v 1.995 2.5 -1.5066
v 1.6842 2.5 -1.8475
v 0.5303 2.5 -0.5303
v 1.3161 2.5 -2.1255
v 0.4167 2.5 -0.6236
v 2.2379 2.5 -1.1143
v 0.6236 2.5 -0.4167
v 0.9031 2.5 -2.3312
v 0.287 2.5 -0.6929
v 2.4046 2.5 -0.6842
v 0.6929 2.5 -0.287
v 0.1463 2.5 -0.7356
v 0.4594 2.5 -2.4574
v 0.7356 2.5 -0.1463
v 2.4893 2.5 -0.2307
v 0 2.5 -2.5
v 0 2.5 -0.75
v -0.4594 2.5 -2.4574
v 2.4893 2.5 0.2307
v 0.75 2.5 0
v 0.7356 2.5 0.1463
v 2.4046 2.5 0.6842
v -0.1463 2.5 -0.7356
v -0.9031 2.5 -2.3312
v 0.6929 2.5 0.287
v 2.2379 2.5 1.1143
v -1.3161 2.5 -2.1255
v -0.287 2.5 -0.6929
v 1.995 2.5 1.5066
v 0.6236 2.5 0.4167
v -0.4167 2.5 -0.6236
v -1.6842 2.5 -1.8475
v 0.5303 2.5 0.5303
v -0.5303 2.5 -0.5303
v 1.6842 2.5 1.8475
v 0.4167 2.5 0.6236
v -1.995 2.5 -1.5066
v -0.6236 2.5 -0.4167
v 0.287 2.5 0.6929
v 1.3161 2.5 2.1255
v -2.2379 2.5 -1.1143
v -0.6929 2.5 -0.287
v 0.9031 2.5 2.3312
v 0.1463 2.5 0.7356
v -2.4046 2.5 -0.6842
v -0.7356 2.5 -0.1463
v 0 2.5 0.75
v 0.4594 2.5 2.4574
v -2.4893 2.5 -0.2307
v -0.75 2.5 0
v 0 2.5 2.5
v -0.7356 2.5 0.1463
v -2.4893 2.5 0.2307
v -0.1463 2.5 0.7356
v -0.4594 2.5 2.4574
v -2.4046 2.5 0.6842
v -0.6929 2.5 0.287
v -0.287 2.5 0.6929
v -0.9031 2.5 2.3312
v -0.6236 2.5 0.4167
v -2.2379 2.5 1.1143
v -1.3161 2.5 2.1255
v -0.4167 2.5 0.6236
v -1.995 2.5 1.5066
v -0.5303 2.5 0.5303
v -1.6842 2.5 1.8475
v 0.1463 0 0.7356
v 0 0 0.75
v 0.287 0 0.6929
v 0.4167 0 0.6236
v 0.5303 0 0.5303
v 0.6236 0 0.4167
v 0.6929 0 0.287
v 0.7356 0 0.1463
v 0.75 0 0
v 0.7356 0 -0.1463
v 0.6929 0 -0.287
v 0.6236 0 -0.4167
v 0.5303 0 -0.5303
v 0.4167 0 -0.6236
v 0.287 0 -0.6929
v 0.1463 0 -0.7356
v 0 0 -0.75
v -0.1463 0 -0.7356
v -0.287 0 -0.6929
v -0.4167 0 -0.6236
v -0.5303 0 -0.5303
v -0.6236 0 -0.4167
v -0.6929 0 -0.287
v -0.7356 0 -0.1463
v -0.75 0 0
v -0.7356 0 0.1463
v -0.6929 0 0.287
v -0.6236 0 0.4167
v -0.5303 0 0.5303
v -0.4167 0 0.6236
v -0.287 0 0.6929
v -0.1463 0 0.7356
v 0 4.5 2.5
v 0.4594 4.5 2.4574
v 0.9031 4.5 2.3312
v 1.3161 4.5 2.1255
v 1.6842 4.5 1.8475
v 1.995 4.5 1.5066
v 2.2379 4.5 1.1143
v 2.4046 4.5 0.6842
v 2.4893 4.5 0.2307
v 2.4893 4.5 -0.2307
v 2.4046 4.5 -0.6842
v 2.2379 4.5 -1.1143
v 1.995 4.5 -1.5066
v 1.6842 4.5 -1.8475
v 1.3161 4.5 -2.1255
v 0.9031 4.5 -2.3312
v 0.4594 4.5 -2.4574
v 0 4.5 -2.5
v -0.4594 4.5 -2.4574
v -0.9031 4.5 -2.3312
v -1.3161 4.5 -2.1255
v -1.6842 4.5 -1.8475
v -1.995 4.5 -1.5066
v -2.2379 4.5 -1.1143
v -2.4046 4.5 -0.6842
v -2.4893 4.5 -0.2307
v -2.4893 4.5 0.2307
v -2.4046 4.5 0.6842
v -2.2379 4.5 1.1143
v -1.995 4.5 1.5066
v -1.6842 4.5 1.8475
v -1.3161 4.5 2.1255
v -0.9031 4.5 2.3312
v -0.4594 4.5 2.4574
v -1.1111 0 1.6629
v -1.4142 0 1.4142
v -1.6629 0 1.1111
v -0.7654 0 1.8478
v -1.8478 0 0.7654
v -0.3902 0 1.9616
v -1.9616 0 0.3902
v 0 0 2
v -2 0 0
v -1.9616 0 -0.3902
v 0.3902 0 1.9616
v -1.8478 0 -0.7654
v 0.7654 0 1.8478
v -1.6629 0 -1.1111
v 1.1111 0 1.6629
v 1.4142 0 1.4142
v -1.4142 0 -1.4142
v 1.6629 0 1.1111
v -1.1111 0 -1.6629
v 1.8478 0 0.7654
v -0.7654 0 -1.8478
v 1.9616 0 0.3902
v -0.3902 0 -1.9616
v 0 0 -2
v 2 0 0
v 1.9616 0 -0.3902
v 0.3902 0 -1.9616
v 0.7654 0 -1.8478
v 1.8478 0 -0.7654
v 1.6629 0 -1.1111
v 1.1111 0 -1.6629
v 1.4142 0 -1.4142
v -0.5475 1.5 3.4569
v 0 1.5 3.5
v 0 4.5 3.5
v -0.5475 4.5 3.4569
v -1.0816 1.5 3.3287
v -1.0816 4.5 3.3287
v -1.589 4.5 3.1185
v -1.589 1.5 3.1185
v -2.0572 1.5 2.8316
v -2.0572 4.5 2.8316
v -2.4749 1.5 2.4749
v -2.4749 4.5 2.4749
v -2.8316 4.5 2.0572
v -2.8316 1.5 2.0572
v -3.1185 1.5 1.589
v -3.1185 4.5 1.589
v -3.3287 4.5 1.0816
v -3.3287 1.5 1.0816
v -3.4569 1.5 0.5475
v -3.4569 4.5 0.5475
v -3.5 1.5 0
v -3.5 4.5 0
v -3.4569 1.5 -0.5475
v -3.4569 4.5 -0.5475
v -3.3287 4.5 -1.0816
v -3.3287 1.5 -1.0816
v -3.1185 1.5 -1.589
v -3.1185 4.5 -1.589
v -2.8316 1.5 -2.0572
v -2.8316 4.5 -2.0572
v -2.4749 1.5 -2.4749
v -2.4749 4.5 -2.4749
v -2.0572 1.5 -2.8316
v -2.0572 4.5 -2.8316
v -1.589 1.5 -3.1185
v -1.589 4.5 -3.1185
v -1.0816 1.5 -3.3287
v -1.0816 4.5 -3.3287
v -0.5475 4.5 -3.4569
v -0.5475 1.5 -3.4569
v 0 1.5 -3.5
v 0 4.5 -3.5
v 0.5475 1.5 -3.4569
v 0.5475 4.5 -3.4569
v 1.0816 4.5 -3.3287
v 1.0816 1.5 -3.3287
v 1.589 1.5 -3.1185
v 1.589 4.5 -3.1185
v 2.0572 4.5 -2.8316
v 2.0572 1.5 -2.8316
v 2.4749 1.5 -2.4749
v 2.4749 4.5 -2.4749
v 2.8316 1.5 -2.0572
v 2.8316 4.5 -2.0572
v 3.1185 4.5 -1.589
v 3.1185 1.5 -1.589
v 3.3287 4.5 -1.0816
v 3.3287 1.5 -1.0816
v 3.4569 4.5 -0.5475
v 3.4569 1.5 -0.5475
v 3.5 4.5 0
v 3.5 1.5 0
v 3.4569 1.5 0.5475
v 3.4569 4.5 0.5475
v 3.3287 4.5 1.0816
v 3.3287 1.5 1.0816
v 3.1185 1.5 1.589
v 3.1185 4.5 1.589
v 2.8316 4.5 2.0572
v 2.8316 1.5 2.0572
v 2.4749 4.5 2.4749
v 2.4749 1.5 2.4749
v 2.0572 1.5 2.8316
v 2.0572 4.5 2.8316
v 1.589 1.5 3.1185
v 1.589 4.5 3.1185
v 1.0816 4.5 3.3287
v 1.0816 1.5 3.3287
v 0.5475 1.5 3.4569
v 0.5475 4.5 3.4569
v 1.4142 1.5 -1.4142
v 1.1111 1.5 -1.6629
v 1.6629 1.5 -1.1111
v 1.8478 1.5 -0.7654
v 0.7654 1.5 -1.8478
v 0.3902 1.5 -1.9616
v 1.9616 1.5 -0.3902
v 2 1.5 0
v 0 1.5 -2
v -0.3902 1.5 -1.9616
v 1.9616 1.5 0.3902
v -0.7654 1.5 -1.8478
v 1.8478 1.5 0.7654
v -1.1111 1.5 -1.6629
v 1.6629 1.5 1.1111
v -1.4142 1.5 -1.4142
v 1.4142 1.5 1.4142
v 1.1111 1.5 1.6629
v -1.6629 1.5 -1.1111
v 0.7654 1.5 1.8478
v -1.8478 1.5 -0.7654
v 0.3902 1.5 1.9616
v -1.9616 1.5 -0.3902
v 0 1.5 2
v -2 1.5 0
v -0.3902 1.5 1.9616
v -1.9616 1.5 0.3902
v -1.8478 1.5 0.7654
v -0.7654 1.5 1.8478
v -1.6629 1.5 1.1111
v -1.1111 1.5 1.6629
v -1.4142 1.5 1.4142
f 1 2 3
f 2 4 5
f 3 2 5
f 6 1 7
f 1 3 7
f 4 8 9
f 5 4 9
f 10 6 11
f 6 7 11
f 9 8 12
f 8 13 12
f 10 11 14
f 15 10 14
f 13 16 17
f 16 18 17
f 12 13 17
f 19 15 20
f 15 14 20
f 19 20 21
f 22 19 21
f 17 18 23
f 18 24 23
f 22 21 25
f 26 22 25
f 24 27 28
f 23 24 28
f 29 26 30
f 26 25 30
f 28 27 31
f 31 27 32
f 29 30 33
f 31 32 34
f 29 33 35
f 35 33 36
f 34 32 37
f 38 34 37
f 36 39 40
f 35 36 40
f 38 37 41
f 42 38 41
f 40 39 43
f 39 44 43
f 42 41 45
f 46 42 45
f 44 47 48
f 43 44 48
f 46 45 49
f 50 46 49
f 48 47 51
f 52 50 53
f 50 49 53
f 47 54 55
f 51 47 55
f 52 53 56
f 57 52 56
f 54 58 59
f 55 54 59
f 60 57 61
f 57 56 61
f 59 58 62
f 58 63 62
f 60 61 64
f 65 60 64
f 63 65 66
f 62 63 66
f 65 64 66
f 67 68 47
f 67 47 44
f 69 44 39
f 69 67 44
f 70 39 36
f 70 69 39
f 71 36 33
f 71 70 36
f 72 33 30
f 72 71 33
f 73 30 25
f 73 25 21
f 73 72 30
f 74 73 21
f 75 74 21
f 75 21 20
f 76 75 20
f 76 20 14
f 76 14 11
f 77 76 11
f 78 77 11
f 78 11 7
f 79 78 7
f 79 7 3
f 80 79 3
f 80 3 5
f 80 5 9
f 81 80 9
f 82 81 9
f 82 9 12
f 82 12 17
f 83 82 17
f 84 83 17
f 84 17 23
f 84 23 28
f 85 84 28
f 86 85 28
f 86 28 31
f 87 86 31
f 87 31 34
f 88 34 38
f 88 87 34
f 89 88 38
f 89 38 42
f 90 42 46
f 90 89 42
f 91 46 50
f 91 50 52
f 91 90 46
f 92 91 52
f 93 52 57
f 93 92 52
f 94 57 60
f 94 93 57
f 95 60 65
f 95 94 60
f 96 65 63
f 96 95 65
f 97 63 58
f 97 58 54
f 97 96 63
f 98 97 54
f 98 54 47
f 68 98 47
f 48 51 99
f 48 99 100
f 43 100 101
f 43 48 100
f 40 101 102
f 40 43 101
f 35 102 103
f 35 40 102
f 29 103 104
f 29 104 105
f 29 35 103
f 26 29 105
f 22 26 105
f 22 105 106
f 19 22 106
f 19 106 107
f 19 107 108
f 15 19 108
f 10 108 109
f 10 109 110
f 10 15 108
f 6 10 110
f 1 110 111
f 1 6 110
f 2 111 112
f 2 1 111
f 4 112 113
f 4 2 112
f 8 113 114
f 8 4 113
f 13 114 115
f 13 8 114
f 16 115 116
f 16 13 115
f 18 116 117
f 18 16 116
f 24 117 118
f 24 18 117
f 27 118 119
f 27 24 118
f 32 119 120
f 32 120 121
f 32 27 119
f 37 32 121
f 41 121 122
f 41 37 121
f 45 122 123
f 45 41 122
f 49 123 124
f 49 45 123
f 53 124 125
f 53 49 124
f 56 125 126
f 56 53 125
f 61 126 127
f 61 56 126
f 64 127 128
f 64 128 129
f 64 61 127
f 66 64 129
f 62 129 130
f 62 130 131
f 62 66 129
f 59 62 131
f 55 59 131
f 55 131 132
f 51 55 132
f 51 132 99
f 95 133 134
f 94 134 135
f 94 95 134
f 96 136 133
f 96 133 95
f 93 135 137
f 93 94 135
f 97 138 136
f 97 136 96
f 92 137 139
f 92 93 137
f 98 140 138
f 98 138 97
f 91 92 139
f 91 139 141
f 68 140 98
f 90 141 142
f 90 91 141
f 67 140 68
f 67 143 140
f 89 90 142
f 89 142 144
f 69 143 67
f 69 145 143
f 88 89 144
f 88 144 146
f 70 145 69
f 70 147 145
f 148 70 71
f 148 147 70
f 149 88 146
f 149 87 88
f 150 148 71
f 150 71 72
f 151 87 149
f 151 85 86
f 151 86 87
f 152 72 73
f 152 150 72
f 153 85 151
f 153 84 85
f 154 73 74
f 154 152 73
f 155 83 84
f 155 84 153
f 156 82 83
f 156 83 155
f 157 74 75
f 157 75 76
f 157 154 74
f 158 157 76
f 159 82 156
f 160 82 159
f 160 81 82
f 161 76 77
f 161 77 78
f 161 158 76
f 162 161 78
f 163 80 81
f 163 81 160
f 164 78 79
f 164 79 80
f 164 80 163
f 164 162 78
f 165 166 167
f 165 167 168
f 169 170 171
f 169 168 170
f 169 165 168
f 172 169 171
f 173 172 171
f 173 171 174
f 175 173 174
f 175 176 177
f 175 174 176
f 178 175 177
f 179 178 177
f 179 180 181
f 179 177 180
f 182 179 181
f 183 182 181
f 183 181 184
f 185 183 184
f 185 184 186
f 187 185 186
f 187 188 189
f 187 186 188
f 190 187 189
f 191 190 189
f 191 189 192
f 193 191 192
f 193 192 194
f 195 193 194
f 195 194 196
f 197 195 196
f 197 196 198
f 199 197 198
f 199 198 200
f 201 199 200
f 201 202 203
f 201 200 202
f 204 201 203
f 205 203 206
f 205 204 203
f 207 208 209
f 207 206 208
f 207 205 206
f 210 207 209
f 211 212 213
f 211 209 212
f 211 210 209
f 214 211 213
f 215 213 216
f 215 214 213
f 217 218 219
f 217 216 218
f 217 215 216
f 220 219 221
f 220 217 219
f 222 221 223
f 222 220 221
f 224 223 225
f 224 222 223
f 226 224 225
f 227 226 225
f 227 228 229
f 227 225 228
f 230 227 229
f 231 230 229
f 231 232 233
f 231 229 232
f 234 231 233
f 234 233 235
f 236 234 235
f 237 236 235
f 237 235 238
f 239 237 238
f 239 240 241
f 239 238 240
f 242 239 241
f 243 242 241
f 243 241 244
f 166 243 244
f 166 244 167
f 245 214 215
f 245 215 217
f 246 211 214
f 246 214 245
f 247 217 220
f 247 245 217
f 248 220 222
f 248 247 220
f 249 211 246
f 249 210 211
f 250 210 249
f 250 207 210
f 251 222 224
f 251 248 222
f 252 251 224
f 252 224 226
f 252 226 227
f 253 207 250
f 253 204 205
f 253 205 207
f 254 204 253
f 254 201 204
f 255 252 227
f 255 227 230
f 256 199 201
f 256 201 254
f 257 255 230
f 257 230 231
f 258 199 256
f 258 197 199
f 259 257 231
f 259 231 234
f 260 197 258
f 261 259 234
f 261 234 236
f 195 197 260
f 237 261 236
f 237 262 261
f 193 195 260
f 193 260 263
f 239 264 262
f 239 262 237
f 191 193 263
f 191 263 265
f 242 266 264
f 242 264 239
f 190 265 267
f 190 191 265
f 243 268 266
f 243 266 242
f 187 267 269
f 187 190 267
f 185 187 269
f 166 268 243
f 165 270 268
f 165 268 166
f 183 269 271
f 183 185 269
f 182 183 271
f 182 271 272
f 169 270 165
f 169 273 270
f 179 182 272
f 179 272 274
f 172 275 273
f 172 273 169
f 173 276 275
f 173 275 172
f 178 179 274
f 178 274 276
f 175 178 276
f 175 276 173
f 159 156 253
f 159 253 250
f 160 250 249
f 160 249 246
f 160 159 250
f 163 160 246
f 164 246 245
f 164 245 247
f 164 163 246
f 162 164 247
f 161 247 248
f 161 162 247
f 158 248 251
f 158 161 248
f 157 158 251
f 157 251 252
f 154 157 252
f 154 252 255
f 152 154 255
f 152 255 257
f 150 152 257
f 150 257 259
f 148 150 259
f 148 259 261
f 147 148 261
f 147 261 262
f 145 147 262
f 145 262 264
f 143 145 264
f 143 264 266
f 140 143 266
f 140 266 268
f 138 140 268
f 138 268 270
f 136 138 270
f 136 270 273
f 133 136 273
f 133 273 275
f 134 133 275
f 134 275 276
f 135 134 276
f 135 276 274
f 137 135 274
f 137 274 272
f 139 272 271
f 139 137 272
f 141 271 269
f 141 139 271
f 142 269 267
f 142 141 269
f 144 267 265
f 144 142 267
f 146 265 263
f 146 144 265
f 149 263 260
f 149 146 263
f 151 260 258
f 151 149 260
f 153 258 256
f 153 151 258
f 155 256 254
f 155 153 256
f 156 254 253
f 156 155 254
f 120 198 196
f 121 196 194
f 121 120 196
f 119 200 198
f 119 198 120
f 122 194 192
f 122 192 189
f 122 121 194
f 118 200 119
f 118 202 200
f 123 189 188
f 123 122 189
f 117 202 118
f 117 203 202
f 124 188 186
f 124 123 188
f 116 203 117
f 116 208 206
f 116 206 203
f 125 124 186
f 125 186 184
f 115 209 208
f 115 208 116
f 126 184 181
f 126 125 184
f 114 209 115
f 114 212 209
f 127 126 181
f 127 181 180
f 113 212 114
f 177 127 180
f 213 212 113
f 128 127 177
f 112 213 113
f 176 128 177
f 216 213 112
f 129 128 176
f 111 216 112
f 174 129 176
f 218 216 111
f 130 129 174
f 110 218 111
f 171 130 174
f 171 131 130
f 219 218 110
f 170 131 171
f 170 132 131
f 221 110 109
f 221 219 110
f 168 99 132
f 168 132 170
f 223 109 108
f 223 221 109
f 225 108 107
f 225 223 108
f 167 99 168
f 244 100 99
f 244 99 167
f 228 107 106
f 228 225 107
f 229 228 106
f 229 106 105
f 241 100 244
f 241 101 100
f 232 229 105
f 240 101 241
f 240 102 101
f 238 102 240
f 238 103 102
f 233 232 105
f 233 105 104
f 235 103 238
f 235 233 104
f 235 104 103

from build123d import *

# Parameters (mm, degrees)
SKETCH1_R           = 1.5
SKETCH1_R_2         = 0.75
BOSS_EXTRUDE1_DEPTH = 2.5
SKETCH2_R           = 3.5
SKETCH2_R_2         = 2.5
BOSS_EXTRUDE2_DEPTH = 2
BOSS_EXTRUDE3_START = 1
SKETCH3_R           = 3.5
SKETCH3_R_2         = 0.75
BOSS_EXTRUDE3_DEPTH = 1
SKETCH4_R           = 2
SKETCH4_R_2         = 0.75
BOSS_EXTRUDE4_DEPTH = 2


with BuildPart() as part:
    # Sketch1 → Boss-Extrude1 (new body)
    with BuildSketch(Plane(origin=(0, 0, 0), x_dir=(1, 0, 0), z_dir=(0, 1, 0))):
        with Locations(Location((0, 0, 0), (0, 0, 270))):
            Circle(SKETCH1_R)
        with Locations(Location((0, 0, 0), (0, 0, 270))):
            Circle(SKETCH1_R_2, mode=Mode.SUBTRACT)
    extrude(amount=BOSS_EXTRUDE1_DEPTH)



with BuildPart() as body_2:
    # Sketch2 → Boss-Extrude2 (new body)
    with BuildSketch(Plane(origin=(0, 2.5, 0), x_dir=(1, 0, 0), z_dir=(0, 1, 0))):
        with Locations(Location((0, 0, 0), (0, 0, 270))):
            Circle(SKETCH2_R)
        with Locations(Location((0, 0, 0), (0, 0, 270))):
            Circle(SKETCH2_R_2, mode=Mode.SUBTRACT)
    extrude(amount=BOSS_EXTRUDE2_DEPTH)


with BuildPart() as part_1:
    add(part.part)

    add(body_2.part)  # Boss-Extrude3 merges body 2
    # Sketch3 → Boss-Extrude3 (add)
    with BuildSketch(Plane(origin=(0, 2.5, 0), x_dir=(-1, 0, 0), z_dir=(0, -1, 0)).offset(BOSS_EXTRUDE3_START)):
        with Locations(Location((0, 0, 0), (0, 0, 270))):
            Circle(SKETCH3_R)
        with Locations(Location((0, 0, 0), (0, 0, 270))):
            Circle(SKETCH3_R_2, mode=Mode.SUBTRACT)
    extrude(amount=-BOSS_EXTRUDE3_DEPTH)

    # Sketch4 → Boss-Extrude4 (add)
    with BuildSketch(Plane(origin=(0, 0, 0), x_dir=(-1, 0, 0), z_dir=(0, -1, 0))):
        with Locations(Location((0, 0, 0), (0, 0, 90))):
            Circle(SKETCH4_R)
        with Locations(Location((0, 0, 0), (0, 0, 270))):
            Circle(SKETCH4_R_2, mode=Mode.SUBTRACT)
    extrude(amount=-BOSS_EXTRUDE4_DEPTH)


solid = part_1.part
